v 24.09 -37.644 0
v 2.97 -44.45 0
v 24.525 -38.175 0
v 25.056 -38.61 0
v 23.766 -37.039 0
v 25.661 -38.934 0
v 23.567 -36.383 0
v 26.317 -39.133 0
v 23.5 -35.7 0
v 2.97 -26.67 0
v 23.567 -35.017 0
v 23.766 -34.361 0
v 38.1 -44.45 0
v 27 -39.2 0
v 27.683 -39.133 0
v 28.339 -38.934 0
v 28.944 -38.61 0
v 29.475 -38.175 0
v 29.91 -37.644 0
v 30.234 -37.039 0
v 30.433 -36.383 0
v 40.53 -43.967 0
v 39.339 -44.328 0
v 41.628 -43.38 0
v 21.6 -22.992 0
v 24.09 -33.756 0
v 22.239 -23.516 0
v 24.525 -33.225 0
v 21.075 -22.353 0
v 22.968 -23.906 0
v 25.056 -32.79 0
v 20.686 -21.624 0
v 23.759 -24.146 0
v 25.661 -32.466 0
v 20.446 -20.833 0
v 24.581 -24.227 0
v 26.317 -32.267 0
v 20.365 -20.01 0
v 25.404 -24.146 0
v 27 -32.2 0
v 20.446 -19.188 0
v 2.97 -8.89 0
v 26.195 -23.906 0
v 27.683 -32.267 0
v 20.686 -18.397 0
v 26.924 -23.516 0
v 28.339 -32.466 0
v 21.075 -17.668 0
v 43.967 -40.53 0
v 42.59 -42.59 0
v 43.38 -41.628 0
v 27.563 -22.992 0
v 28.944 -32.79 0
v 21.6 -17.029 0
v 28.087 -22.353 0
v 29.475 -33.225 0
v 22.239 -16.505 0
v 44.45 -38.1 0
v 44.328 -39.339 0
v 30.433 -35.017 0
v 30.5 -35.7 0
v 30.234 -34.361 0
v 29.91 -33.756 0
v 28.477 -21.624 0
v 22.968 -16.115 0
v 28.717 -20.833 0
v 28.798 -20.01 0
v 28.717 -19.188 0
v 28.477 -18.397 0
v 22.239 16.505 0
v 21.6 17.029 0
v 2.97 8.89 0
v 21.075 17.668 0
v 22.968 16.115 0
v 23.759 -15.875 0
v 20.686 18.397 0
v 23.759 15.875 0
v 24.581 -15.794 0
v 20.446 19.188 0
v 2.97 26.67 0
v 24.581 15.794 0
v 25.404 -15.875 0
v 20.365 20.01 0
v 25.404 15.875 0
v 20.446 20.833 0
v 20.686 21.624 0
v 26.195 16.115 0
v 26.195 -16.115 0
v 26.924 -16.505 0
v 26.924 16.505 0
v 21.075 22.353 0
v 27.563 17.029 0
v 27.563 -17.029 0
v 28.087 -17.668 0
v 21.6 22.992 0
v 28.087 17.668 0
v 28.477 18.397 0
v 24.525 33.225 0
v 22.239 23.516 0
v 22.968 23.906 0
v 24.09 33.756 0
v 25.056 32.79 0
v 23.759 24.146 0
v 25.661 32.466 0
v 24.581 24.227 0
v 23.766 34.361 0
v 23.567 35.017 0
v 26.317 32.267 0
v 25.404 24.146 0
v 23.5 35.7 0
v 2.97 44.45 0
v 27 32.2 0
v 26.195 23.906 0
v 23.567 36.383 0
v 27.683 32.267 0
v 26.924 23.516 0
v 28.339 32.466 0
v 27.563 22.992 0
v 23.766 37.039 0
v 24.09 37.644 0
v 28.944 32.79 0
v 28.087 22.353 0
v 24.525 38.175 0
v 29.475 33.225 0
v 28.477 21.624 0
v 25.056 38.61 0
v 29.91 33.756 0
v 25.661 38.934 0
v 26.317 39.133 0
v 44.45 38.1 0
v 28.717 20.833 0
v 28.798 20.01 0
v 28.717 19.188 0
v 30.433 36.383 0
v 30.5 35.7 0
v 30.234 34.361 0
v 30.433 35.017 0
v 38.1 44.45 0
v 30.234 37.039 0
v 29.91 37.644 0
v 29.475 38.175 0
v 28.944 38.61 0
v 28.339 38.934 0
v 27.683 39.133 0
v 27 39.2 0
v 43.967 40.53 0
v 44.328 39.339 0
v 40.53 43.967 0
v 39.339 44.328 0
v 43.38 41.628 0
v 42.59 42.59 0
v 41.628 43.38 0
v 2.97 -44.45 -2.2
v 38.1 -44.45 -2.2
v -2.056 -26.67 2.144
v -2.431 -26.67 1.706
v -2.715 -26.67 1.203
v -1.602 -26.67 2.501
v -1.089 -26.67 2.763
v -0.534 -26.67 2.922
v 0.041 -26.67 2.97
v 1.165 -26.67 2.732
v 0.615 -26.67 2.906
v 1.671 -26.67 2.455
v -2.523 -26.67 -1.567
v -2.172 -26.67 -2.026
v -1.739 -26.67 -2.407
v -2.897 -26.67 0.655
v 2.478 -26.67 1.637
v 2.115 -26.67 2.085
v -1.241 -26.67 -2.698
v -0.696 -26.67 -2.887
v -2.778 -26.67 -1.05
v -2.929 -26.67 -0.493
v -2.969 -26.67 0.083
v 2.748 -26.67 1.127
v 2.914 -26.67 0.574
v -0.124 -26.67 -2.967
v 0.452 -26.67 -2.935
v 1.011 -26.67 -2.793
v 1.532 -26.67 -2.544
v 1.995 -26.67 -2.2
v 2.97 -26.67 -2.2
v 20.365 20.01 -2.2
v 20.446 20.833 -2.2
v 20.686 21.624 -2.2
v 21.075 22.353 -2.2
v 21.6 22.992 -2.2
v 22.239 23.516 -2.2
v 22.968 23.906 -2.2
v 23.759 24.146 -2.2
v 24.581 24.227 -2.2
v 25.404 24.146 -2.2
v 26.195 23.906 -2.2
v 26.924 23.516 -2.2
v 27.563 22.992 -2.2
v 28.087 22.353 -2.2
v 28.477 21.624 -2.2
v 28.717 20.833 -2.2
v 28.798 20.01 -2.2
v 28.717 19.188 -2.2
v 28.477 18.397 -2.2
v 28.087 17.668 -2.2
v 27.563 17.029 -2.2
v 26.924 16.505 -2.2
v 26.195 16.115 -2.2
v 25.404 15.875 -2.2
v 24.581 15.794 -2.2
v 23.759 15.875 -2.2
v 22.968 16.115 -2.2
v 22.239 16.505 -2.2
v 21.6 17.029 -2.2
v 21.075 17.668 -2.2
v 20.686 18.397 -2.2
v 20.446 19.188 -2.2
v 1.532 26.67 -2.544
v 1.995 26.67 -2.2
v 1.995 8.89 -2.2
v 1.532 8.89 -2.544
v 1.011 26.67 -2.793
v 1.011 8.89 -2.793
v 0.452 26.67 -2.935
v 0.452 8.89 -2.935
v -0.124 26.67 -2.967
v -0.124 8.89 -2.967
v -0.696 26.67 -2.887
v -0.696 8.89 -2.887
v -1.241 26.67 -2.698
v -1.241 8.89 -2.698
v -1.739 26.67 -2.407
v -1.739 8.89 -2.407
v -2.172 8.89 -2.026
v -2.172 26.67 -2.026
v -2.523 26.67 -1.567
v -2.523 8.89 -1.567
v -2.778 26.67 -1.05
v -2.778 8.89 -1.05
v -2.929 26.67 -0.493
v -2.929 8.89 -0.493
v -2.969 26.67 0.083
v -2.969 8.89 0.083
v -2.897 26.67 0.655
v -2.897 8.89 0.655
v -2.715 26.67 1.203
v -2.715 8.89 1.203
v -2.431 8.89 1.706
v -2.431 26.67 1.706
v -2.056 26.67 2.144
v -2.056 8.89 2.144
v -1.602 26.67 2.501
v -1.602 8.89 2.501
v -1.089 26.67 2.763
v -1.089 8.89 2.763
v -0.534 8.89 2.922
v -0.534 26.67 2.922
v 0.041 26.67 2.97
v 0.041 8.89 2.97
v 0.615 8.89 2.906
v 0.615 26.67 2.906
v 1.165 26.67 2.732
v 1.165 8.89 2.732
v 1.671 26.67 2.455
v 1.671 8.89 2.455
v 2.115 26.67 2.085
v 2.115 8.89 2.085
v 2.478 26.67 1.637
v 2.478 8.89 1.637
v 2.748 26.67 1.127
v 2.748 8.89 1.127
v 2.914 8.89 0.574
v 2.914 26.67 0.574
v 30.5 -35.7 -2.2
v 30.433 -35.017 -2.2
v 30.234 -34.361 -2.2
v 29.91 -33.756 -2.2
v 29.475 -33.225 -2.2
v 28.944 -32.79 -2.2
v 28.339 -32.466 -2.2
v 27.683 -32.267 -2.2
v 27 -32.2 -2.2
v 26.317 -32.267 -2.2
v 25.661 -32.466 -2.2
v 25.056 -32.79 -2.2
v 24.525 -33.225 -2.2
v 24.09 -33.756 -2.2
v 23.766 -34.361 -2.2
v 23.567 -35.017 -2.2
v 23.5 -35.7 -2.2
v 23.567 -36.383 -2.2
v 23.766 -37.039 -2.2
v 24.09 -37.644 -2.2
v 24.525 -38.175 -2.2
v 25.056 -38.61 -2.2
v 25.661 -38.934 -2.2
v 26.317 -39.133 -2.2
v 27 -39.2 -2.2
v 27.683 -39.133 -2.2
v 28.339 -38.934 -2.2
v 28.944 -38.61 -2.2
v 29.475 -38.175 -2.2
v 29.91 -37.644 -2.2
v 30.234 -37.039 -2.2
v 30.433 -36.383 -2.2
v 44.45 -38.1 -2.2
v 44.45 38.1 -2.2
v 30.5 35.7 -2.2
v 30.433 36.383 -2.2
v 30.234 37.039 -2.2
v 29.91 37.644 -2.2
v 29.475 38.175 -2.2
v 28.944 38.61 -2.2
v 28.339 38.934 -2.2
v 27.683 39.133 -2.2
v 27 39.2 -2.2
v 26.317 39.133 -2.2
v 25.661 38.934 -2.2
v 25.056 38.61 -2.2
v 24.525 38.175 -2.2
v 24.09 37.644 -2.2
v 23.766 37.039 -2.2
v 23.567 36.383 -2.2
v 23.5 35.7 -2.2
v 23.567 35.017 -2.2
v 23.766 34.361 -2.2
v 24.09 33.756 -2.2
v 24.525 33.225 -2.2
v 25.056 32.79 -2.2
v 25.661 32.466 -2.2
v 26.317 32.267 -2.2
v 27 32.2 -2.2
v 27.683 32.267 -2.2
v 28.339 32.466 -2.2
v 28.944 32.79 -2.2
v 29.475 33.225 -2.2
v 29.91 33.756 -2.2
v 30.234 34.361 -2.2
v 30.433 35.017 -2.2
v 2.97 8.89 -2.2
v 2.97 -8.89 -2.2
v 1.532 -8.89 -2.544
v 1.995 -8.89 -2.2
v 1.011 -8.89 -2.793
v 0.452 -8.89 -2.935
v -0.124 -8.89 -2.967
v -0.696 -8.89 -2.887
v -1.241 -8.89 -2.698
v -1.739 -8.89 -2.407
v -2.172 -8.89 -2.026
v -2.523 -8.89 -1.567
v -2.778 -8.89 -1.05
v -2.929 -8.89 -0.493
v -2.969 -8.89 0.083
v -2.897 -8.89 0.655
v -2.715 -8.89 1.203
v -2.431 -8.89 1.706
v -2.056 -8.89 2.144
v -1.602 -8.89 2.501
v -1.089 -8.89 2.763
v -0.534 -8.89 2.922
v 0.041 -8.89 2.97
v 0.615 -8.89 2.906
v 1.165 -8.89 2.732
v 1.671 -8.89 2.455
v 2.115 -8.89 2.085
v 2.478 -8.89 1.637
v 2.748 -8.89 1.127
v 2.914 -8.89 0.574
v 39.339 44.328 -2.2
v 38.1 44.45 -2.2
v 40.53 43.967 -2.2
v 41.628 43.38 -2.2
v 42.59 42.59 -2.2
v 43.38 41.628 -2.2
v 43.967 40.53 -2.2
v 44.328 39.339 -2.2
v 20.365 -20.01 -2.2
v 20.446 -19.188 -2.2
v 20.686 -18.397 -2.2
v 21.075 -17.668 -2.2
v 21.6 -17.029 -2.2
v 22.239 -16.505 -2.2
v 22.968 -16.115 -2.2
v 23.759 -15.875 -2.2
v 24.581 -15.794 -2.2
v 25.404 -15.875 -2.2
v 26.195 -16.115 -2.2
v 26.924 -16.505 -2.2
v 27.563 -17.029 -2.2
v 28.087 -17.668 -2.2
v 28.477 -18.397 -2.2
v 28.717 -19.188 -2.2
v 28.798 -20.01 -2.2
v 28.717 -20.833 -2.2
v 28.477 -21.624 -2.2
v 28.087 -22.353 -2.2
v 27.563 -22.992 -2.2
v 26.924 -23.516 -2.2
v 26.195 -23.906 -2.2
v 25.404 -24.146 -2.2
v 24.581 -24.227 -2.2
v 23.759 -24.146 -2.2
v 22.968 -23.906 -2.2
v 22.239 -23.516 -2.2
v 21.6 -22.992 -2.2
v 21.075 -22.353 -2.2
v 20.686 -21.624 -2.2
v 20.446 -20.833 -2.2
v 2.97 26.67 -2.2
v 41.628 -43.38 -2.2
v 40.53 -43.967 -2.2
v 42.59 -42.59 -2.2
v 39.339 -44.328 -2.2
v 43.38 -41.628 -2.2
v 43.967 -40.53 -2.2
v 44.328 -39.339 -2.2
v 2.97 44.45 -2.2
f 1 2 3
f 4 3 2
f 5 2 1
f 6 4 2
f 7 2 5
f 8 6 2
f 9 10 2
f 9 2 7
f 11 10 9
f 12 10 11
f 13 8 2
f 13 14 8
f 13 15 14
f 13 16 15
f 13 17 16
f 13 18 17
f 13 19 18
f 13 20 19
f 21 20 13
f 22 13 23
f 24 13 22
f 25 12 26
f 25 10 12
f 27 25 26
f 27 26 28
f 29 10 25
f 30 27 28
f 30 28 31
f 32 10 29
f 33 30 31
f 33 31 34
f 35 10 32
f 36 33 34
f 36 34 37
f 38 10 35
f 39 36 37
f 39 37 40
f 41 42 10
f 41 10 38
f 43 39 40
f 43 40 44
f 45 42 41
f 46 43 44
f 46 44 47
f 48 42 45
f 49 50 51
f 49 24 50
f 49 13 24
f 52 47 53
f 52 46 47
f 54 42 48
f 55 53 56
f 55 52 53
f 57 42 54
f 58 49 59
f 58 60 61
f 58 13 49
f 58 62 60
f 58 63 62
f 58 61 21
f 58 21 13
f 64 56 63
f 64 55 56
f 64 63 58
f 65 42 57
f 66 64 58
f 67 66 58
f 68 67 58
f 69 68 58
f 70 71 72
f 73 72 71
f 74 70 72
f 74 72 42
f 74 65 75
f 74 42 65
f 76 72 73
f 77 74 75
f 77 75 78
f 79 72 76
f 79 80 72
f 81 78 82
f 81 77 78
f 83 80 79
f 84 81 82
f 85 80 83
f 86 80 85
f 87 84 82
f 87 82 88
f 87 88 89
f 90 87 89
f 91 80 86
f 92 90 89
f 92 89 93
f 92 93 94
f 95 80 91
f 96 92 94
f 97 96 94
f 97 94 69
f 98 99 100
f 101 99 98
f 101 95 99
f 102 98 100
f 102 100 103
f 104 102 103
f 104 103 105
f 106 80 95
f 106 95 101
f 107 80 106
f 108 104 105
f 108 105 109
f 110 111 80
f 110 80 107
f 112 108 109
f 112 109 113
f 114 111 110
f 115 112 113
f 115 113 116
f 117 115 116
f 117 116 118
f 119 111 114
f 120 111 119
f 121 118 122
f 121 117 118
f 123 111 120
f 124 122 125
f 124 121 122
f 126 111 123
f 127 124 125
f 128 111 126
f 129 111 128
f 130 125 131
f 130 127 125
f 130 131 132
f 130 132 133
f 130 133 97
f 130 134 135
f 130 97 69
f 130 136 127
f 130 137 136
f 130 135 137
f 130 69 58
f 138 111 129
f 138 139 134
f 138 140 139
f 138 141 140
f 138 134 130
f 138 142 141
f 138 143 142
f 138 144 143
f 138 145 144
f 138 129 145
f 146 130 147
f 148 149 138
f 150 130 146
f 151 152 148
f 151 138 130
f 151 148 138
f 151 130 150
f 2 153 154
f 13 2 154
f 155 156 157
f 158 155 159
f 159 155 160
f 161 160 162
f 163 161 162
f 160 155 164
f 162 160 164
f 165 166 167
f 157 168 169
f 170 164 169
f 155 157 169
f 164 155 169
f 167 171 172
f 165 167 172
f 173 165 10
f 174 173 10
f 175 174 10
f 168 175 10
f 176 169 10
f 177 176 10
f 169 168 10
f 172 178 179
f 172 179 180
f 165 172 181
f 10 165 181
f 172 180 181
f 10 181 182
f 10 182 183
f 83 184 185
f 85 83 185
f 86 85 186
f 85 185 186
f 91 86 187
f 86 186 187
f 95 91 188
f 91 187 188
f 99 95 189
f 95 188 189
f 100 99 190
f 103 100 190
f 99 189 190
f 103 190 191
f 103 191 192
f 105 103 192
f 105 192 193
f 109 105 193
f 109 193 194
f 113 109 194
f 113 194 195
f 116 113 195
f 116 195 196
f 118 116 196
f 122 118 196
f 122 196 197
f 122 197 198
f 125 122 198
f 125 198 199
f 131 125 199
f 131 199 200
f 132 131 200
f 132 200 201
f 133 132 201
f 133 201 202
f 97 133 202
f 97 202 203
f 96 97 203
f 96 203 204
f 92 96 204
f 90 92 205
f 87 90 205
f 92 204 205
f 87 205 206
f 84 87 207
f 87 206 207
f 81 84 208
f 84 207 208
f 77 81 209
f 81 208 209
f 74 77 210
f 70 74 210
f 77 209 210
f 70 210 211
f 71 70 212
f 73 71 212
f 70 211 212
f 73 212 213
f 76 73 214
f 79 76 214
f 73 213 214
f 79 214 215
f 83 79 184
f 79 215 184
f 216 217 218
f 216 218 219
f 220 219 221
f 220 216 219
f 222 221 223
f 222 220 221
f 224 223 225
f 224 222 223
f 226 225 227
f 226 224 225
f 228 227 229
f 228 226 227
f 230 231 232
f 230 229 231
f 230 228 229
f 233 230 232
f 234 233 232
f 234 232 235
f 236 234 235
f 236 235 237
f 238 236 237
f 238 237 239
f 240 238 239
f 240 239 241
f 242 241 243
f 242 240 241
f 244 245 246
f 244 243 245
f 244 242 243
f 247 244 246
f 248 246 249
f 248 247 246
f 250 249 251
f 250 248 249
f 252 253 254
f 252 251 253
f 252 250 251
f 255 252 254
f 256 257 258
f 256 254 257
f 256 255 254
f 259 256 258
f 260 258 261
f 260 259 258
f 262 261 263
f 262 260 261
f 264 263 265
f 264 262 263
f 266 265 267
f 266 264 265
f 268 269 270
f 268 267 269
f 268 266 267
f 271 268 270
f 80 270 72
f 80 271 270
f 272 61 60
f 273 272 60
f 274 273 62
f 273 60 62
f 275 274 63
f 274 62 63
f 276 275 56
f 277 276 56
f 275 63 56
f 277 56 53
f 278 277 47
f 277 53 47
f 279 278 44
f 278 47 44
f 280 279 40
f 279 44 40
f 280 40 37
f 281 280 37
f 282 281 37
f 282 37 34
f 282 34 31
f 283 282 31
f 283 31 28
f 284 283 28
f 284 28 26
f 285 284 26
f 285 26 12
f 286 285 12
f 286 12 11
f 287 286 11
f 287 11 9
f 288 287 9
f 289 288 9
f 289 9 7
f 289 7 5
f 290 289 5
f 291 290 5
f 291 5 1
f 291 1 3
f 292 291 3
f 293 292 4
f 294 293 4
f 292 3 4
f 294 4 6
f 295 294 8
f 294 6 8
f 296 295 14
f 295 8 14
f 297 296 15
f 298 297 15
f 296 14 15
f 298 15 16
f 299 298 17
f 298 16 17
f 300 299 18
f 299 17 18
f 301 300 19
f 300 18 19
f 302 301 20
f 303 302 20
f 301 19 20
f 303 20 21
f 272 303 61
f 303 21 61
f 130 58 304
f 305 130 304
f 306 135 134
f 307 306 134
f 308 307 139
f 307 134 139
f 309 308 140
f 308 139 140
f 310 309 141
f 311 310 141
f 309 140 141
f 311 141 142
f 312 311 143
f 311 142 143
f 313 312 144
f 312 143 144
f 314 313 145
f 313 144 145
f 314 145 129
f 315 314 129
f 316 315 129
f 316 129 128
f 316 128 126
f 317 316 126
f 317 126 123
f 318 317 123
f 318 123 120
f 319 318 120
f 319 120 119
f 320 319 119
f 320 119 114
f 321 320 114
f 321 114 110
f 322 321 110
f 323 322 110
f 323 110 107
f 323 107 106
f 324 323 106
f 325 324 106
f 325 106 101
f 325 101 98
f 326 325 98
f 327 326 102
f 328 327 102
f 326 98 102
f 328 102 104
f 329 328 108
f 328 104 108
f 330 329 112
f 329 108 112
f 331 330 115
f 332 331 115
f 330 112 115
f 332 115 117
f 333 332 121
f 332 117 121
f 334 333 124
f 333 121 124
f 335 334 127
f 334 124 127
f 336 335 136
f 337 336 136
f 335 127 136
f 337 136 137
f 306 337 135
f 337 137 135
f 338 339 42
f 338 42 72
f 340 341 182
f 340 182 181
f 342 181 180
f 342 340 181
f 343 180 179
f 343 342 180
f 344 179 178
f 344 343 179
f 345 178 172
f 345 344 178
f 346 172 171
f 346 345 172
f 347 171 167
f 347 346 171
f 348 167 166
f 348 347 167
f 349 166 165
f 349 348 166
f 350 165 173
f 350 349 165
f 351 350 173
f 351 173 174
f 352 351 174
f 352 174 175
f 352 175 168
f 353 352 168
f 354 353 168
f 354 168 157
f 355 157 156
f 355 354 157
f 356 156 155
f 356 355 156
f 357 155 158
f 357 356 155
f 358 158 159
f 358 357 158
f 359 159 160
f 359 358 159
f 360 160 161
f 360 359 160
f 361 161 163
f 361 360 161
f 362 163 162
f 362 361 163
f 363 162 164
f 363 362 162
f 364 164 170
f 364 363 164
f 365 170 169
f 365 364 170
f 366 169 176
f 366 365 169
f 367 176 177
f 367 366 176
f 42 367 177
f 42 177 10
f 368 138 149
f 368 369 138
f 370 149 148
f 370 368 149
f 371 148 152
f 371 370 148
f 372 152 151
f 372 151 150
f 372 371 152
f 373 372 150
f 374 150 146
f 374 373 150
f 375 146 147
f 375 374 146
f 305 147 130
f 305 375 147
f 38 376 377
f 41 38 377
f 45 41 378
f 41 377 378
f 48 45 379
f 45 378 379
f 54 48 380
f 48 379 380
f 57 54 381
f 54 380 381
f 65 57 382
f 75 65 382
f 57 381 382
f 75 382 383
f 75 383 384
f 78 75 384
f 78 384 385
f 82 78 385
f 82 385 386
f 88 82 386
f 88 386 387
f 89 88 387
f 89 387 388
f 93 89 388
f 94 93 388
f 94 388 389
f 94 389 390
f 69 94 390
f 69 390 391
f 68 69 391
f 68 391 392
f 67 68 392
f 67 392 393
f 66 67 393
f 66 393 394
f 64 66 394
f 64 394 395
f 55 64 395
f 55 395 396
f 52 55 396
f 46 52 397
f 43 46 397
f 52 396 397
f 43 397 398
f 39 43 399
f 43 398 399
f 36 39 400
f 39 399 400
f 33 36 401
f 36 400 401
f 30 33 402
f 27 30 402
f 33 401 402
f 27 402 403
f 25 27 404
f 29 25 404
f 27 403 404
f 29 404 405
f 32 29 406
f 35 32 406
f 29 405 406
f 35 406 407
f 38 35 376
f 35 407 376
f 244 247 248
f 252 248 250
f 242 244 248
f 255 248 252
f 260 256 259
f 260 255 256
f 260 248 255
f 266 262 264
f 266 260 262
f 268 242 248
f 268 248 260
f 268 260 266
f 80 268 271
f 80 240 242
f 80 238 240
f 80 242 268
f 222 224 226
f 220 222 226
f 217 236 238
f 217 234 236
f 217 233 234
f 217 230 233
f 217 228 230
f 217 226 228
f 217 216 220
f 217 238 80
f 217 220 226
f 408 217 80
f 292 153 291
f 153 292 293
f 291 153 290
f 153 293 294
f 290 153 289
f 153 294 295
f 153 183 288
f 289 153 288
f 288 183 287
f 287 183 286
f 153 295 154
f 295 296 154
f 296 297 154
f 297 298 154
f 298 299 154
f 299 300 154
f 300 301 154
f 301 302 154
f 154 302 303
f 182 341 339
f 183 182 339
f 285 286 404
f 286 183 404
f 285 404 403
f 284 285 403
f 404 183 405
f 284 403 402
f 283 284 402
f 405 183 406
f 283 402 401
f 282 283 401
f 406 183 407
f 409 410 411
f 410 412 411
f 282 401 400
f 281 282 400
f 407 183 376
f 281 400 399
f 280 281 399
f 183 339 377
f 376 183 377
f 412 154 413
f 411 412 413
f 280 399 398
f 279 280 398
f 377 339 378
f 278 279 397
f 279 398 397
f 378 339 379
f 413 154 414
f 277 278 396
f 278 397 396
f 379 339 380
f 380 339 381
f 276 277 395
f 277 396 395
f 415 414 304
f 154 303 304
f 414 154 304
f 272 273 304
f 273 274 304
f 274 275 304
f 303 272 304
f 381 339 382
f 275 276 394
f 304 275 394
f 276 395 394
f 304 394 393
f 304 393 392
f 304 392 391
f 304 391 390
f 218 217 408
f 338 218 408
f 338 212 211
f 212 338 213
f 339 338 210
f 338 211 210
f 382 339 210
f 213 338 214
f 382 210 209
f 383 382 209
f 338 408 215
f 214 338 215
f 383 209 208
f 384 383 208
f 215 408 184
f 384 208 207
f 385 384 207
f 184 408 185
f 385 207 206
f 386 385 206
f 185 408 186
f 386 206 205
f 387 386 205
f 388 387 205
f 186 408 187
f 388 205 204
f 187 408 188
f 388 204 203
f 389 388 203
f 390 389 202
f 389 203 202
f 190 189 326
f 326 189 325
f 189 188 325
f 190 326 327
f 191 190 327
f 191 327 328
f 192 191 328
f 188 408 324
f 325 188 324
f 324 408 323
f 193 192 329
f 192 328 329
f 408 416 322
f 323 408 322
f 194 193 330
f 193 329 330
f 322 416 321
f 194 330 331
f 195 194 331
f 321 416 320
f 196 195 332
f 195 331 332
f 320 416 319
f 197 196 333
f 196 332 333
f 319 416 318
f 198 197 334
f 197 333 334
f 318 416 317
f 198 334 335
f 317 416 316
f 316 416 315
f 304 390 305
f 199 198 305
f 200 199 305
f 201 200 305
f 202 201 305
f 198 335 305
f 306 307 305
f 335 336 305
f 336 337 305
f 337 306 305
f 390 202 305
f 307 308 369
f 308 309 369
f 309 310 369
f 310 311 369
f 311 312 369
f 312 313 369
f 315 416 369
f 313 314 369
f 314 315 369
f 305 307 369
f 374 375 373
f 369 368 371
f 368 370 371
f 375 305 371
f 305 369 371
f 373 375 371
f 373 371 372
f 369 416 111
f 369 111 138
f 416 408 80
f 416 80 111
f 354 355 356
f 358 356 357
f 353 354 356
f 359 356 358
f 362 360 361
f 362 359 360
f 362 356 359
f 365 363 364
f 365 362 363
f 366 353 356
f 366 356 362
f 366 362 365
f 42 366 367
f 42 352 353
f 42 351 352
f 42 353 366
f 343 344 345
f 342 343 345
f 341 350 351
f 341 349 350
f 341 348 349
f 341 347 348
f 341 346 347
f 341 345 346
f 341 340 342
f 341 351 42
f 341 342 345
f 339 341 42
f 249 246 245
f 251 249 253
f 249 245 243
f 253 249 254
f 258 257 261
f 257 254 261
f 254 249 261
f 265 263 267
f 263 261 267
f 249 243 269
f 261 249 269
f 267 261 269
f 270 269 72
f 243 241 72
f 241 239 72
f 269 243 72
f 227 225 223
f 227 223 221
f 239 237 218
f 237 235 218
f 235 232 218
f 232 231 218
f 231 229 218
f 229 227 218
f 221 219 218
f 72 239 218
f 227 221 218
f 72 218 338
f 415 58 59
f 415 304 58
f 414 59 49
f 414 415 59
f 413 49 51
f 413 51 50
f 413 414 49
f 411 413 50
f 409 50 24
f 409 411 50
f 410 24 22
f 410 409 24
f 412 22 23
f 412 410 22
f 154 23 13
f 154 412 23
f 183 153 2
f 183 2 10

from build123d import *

# Parameters (mm, degrees)
SKETCH1_R                = 2.97
SKETCH1_W                = 44.45
SKETCH1_H                = 2.2
BOSS_EXTRUDE1_DEPTH      = 44.45
CUT_EXTRUDE1_DEPTH       = 63.931914797
CUT_EXTRUDE1_DEPTH_BACK  = 63.931914797
SKETCH2_W                = 5.94
SKETCH2_H                = 17.78
FILLET1_R                = 6.35
SKETCH4_R                = 3.5
CUT_EXTRUDE2_DEPTH       = 63.931914797
F_5_16_CLEARANCE_HOLE1_D = 8.4328


with BuildPart() as part:
    # Sketch1 → Boss-Extrude1 (new, symmetric)
    with BuildSketch(Plane(origin=(0, 0, 0), x_dir=(1, 0, 0), z_dir=(0, 1, 0))):
        Circle(SKETCH1_R)
        with Locations((22.225, 1.1)):
            Rectangle(SKETCH1_W, SKETCH1_H)
    extrude(amount=BOSS_EXTRUDE1_DEPTH, both=True)

    # Sketch2 → Cut-Extrude1 (cut, two sides: drawn at the far end of the back side and taken through both)
    with BuildSketch(Plane.XY.offset(-CUT_EXTRUDE1_DEPTH_BACK)):
        with Locations((0, 35.56)):
            Rectangle(SKETCH2_W, SKETCH2_H)
        Rectangle(SKETCH2_W, SKETCH2_H)
        with Locations((0, -35.56)):
            Rectangle(SKETCH2_W, SKETCH2_H)
    extrude(amount=CUT_EXTRUDE1_DEPTH + CUT_EXTRUDE1_DEPTH_BACK, mode=Mode.SUBTRACT)

    # Fillet1
    fillet1_edges = [part.edges().sort_by_distance(p)[0] for p in [
        (44.45, 44.45, -1.1),
        (44.45, -44.45, -1.1),
    ]]
    fillet(fillet1_edges, radius=FILLET1_R)

    # Sketch4 → Cut-Extrude2 (cut, through all)
    with BuildSketch(Plane.XY):
        with Locations((27, 35.7)):
            Circle(SKETCH4_R)
        with Locations((27, -35.7)):
            Circle(SKETCH4_R)
    extrude(amount=-CUT_EXTRUDE2_DEPTH, mode=Mode.SUBTRACT)

    # 5/16 Clearance Hole1 (through all)
    with Locations(Plane.XY):
        with Locations((24.58125, 20.010345019), (24.58125, -20.010345019)):
            Hole(F_5_16_CLEARANCE_HOLE1_D / 2)


solid = part.part
